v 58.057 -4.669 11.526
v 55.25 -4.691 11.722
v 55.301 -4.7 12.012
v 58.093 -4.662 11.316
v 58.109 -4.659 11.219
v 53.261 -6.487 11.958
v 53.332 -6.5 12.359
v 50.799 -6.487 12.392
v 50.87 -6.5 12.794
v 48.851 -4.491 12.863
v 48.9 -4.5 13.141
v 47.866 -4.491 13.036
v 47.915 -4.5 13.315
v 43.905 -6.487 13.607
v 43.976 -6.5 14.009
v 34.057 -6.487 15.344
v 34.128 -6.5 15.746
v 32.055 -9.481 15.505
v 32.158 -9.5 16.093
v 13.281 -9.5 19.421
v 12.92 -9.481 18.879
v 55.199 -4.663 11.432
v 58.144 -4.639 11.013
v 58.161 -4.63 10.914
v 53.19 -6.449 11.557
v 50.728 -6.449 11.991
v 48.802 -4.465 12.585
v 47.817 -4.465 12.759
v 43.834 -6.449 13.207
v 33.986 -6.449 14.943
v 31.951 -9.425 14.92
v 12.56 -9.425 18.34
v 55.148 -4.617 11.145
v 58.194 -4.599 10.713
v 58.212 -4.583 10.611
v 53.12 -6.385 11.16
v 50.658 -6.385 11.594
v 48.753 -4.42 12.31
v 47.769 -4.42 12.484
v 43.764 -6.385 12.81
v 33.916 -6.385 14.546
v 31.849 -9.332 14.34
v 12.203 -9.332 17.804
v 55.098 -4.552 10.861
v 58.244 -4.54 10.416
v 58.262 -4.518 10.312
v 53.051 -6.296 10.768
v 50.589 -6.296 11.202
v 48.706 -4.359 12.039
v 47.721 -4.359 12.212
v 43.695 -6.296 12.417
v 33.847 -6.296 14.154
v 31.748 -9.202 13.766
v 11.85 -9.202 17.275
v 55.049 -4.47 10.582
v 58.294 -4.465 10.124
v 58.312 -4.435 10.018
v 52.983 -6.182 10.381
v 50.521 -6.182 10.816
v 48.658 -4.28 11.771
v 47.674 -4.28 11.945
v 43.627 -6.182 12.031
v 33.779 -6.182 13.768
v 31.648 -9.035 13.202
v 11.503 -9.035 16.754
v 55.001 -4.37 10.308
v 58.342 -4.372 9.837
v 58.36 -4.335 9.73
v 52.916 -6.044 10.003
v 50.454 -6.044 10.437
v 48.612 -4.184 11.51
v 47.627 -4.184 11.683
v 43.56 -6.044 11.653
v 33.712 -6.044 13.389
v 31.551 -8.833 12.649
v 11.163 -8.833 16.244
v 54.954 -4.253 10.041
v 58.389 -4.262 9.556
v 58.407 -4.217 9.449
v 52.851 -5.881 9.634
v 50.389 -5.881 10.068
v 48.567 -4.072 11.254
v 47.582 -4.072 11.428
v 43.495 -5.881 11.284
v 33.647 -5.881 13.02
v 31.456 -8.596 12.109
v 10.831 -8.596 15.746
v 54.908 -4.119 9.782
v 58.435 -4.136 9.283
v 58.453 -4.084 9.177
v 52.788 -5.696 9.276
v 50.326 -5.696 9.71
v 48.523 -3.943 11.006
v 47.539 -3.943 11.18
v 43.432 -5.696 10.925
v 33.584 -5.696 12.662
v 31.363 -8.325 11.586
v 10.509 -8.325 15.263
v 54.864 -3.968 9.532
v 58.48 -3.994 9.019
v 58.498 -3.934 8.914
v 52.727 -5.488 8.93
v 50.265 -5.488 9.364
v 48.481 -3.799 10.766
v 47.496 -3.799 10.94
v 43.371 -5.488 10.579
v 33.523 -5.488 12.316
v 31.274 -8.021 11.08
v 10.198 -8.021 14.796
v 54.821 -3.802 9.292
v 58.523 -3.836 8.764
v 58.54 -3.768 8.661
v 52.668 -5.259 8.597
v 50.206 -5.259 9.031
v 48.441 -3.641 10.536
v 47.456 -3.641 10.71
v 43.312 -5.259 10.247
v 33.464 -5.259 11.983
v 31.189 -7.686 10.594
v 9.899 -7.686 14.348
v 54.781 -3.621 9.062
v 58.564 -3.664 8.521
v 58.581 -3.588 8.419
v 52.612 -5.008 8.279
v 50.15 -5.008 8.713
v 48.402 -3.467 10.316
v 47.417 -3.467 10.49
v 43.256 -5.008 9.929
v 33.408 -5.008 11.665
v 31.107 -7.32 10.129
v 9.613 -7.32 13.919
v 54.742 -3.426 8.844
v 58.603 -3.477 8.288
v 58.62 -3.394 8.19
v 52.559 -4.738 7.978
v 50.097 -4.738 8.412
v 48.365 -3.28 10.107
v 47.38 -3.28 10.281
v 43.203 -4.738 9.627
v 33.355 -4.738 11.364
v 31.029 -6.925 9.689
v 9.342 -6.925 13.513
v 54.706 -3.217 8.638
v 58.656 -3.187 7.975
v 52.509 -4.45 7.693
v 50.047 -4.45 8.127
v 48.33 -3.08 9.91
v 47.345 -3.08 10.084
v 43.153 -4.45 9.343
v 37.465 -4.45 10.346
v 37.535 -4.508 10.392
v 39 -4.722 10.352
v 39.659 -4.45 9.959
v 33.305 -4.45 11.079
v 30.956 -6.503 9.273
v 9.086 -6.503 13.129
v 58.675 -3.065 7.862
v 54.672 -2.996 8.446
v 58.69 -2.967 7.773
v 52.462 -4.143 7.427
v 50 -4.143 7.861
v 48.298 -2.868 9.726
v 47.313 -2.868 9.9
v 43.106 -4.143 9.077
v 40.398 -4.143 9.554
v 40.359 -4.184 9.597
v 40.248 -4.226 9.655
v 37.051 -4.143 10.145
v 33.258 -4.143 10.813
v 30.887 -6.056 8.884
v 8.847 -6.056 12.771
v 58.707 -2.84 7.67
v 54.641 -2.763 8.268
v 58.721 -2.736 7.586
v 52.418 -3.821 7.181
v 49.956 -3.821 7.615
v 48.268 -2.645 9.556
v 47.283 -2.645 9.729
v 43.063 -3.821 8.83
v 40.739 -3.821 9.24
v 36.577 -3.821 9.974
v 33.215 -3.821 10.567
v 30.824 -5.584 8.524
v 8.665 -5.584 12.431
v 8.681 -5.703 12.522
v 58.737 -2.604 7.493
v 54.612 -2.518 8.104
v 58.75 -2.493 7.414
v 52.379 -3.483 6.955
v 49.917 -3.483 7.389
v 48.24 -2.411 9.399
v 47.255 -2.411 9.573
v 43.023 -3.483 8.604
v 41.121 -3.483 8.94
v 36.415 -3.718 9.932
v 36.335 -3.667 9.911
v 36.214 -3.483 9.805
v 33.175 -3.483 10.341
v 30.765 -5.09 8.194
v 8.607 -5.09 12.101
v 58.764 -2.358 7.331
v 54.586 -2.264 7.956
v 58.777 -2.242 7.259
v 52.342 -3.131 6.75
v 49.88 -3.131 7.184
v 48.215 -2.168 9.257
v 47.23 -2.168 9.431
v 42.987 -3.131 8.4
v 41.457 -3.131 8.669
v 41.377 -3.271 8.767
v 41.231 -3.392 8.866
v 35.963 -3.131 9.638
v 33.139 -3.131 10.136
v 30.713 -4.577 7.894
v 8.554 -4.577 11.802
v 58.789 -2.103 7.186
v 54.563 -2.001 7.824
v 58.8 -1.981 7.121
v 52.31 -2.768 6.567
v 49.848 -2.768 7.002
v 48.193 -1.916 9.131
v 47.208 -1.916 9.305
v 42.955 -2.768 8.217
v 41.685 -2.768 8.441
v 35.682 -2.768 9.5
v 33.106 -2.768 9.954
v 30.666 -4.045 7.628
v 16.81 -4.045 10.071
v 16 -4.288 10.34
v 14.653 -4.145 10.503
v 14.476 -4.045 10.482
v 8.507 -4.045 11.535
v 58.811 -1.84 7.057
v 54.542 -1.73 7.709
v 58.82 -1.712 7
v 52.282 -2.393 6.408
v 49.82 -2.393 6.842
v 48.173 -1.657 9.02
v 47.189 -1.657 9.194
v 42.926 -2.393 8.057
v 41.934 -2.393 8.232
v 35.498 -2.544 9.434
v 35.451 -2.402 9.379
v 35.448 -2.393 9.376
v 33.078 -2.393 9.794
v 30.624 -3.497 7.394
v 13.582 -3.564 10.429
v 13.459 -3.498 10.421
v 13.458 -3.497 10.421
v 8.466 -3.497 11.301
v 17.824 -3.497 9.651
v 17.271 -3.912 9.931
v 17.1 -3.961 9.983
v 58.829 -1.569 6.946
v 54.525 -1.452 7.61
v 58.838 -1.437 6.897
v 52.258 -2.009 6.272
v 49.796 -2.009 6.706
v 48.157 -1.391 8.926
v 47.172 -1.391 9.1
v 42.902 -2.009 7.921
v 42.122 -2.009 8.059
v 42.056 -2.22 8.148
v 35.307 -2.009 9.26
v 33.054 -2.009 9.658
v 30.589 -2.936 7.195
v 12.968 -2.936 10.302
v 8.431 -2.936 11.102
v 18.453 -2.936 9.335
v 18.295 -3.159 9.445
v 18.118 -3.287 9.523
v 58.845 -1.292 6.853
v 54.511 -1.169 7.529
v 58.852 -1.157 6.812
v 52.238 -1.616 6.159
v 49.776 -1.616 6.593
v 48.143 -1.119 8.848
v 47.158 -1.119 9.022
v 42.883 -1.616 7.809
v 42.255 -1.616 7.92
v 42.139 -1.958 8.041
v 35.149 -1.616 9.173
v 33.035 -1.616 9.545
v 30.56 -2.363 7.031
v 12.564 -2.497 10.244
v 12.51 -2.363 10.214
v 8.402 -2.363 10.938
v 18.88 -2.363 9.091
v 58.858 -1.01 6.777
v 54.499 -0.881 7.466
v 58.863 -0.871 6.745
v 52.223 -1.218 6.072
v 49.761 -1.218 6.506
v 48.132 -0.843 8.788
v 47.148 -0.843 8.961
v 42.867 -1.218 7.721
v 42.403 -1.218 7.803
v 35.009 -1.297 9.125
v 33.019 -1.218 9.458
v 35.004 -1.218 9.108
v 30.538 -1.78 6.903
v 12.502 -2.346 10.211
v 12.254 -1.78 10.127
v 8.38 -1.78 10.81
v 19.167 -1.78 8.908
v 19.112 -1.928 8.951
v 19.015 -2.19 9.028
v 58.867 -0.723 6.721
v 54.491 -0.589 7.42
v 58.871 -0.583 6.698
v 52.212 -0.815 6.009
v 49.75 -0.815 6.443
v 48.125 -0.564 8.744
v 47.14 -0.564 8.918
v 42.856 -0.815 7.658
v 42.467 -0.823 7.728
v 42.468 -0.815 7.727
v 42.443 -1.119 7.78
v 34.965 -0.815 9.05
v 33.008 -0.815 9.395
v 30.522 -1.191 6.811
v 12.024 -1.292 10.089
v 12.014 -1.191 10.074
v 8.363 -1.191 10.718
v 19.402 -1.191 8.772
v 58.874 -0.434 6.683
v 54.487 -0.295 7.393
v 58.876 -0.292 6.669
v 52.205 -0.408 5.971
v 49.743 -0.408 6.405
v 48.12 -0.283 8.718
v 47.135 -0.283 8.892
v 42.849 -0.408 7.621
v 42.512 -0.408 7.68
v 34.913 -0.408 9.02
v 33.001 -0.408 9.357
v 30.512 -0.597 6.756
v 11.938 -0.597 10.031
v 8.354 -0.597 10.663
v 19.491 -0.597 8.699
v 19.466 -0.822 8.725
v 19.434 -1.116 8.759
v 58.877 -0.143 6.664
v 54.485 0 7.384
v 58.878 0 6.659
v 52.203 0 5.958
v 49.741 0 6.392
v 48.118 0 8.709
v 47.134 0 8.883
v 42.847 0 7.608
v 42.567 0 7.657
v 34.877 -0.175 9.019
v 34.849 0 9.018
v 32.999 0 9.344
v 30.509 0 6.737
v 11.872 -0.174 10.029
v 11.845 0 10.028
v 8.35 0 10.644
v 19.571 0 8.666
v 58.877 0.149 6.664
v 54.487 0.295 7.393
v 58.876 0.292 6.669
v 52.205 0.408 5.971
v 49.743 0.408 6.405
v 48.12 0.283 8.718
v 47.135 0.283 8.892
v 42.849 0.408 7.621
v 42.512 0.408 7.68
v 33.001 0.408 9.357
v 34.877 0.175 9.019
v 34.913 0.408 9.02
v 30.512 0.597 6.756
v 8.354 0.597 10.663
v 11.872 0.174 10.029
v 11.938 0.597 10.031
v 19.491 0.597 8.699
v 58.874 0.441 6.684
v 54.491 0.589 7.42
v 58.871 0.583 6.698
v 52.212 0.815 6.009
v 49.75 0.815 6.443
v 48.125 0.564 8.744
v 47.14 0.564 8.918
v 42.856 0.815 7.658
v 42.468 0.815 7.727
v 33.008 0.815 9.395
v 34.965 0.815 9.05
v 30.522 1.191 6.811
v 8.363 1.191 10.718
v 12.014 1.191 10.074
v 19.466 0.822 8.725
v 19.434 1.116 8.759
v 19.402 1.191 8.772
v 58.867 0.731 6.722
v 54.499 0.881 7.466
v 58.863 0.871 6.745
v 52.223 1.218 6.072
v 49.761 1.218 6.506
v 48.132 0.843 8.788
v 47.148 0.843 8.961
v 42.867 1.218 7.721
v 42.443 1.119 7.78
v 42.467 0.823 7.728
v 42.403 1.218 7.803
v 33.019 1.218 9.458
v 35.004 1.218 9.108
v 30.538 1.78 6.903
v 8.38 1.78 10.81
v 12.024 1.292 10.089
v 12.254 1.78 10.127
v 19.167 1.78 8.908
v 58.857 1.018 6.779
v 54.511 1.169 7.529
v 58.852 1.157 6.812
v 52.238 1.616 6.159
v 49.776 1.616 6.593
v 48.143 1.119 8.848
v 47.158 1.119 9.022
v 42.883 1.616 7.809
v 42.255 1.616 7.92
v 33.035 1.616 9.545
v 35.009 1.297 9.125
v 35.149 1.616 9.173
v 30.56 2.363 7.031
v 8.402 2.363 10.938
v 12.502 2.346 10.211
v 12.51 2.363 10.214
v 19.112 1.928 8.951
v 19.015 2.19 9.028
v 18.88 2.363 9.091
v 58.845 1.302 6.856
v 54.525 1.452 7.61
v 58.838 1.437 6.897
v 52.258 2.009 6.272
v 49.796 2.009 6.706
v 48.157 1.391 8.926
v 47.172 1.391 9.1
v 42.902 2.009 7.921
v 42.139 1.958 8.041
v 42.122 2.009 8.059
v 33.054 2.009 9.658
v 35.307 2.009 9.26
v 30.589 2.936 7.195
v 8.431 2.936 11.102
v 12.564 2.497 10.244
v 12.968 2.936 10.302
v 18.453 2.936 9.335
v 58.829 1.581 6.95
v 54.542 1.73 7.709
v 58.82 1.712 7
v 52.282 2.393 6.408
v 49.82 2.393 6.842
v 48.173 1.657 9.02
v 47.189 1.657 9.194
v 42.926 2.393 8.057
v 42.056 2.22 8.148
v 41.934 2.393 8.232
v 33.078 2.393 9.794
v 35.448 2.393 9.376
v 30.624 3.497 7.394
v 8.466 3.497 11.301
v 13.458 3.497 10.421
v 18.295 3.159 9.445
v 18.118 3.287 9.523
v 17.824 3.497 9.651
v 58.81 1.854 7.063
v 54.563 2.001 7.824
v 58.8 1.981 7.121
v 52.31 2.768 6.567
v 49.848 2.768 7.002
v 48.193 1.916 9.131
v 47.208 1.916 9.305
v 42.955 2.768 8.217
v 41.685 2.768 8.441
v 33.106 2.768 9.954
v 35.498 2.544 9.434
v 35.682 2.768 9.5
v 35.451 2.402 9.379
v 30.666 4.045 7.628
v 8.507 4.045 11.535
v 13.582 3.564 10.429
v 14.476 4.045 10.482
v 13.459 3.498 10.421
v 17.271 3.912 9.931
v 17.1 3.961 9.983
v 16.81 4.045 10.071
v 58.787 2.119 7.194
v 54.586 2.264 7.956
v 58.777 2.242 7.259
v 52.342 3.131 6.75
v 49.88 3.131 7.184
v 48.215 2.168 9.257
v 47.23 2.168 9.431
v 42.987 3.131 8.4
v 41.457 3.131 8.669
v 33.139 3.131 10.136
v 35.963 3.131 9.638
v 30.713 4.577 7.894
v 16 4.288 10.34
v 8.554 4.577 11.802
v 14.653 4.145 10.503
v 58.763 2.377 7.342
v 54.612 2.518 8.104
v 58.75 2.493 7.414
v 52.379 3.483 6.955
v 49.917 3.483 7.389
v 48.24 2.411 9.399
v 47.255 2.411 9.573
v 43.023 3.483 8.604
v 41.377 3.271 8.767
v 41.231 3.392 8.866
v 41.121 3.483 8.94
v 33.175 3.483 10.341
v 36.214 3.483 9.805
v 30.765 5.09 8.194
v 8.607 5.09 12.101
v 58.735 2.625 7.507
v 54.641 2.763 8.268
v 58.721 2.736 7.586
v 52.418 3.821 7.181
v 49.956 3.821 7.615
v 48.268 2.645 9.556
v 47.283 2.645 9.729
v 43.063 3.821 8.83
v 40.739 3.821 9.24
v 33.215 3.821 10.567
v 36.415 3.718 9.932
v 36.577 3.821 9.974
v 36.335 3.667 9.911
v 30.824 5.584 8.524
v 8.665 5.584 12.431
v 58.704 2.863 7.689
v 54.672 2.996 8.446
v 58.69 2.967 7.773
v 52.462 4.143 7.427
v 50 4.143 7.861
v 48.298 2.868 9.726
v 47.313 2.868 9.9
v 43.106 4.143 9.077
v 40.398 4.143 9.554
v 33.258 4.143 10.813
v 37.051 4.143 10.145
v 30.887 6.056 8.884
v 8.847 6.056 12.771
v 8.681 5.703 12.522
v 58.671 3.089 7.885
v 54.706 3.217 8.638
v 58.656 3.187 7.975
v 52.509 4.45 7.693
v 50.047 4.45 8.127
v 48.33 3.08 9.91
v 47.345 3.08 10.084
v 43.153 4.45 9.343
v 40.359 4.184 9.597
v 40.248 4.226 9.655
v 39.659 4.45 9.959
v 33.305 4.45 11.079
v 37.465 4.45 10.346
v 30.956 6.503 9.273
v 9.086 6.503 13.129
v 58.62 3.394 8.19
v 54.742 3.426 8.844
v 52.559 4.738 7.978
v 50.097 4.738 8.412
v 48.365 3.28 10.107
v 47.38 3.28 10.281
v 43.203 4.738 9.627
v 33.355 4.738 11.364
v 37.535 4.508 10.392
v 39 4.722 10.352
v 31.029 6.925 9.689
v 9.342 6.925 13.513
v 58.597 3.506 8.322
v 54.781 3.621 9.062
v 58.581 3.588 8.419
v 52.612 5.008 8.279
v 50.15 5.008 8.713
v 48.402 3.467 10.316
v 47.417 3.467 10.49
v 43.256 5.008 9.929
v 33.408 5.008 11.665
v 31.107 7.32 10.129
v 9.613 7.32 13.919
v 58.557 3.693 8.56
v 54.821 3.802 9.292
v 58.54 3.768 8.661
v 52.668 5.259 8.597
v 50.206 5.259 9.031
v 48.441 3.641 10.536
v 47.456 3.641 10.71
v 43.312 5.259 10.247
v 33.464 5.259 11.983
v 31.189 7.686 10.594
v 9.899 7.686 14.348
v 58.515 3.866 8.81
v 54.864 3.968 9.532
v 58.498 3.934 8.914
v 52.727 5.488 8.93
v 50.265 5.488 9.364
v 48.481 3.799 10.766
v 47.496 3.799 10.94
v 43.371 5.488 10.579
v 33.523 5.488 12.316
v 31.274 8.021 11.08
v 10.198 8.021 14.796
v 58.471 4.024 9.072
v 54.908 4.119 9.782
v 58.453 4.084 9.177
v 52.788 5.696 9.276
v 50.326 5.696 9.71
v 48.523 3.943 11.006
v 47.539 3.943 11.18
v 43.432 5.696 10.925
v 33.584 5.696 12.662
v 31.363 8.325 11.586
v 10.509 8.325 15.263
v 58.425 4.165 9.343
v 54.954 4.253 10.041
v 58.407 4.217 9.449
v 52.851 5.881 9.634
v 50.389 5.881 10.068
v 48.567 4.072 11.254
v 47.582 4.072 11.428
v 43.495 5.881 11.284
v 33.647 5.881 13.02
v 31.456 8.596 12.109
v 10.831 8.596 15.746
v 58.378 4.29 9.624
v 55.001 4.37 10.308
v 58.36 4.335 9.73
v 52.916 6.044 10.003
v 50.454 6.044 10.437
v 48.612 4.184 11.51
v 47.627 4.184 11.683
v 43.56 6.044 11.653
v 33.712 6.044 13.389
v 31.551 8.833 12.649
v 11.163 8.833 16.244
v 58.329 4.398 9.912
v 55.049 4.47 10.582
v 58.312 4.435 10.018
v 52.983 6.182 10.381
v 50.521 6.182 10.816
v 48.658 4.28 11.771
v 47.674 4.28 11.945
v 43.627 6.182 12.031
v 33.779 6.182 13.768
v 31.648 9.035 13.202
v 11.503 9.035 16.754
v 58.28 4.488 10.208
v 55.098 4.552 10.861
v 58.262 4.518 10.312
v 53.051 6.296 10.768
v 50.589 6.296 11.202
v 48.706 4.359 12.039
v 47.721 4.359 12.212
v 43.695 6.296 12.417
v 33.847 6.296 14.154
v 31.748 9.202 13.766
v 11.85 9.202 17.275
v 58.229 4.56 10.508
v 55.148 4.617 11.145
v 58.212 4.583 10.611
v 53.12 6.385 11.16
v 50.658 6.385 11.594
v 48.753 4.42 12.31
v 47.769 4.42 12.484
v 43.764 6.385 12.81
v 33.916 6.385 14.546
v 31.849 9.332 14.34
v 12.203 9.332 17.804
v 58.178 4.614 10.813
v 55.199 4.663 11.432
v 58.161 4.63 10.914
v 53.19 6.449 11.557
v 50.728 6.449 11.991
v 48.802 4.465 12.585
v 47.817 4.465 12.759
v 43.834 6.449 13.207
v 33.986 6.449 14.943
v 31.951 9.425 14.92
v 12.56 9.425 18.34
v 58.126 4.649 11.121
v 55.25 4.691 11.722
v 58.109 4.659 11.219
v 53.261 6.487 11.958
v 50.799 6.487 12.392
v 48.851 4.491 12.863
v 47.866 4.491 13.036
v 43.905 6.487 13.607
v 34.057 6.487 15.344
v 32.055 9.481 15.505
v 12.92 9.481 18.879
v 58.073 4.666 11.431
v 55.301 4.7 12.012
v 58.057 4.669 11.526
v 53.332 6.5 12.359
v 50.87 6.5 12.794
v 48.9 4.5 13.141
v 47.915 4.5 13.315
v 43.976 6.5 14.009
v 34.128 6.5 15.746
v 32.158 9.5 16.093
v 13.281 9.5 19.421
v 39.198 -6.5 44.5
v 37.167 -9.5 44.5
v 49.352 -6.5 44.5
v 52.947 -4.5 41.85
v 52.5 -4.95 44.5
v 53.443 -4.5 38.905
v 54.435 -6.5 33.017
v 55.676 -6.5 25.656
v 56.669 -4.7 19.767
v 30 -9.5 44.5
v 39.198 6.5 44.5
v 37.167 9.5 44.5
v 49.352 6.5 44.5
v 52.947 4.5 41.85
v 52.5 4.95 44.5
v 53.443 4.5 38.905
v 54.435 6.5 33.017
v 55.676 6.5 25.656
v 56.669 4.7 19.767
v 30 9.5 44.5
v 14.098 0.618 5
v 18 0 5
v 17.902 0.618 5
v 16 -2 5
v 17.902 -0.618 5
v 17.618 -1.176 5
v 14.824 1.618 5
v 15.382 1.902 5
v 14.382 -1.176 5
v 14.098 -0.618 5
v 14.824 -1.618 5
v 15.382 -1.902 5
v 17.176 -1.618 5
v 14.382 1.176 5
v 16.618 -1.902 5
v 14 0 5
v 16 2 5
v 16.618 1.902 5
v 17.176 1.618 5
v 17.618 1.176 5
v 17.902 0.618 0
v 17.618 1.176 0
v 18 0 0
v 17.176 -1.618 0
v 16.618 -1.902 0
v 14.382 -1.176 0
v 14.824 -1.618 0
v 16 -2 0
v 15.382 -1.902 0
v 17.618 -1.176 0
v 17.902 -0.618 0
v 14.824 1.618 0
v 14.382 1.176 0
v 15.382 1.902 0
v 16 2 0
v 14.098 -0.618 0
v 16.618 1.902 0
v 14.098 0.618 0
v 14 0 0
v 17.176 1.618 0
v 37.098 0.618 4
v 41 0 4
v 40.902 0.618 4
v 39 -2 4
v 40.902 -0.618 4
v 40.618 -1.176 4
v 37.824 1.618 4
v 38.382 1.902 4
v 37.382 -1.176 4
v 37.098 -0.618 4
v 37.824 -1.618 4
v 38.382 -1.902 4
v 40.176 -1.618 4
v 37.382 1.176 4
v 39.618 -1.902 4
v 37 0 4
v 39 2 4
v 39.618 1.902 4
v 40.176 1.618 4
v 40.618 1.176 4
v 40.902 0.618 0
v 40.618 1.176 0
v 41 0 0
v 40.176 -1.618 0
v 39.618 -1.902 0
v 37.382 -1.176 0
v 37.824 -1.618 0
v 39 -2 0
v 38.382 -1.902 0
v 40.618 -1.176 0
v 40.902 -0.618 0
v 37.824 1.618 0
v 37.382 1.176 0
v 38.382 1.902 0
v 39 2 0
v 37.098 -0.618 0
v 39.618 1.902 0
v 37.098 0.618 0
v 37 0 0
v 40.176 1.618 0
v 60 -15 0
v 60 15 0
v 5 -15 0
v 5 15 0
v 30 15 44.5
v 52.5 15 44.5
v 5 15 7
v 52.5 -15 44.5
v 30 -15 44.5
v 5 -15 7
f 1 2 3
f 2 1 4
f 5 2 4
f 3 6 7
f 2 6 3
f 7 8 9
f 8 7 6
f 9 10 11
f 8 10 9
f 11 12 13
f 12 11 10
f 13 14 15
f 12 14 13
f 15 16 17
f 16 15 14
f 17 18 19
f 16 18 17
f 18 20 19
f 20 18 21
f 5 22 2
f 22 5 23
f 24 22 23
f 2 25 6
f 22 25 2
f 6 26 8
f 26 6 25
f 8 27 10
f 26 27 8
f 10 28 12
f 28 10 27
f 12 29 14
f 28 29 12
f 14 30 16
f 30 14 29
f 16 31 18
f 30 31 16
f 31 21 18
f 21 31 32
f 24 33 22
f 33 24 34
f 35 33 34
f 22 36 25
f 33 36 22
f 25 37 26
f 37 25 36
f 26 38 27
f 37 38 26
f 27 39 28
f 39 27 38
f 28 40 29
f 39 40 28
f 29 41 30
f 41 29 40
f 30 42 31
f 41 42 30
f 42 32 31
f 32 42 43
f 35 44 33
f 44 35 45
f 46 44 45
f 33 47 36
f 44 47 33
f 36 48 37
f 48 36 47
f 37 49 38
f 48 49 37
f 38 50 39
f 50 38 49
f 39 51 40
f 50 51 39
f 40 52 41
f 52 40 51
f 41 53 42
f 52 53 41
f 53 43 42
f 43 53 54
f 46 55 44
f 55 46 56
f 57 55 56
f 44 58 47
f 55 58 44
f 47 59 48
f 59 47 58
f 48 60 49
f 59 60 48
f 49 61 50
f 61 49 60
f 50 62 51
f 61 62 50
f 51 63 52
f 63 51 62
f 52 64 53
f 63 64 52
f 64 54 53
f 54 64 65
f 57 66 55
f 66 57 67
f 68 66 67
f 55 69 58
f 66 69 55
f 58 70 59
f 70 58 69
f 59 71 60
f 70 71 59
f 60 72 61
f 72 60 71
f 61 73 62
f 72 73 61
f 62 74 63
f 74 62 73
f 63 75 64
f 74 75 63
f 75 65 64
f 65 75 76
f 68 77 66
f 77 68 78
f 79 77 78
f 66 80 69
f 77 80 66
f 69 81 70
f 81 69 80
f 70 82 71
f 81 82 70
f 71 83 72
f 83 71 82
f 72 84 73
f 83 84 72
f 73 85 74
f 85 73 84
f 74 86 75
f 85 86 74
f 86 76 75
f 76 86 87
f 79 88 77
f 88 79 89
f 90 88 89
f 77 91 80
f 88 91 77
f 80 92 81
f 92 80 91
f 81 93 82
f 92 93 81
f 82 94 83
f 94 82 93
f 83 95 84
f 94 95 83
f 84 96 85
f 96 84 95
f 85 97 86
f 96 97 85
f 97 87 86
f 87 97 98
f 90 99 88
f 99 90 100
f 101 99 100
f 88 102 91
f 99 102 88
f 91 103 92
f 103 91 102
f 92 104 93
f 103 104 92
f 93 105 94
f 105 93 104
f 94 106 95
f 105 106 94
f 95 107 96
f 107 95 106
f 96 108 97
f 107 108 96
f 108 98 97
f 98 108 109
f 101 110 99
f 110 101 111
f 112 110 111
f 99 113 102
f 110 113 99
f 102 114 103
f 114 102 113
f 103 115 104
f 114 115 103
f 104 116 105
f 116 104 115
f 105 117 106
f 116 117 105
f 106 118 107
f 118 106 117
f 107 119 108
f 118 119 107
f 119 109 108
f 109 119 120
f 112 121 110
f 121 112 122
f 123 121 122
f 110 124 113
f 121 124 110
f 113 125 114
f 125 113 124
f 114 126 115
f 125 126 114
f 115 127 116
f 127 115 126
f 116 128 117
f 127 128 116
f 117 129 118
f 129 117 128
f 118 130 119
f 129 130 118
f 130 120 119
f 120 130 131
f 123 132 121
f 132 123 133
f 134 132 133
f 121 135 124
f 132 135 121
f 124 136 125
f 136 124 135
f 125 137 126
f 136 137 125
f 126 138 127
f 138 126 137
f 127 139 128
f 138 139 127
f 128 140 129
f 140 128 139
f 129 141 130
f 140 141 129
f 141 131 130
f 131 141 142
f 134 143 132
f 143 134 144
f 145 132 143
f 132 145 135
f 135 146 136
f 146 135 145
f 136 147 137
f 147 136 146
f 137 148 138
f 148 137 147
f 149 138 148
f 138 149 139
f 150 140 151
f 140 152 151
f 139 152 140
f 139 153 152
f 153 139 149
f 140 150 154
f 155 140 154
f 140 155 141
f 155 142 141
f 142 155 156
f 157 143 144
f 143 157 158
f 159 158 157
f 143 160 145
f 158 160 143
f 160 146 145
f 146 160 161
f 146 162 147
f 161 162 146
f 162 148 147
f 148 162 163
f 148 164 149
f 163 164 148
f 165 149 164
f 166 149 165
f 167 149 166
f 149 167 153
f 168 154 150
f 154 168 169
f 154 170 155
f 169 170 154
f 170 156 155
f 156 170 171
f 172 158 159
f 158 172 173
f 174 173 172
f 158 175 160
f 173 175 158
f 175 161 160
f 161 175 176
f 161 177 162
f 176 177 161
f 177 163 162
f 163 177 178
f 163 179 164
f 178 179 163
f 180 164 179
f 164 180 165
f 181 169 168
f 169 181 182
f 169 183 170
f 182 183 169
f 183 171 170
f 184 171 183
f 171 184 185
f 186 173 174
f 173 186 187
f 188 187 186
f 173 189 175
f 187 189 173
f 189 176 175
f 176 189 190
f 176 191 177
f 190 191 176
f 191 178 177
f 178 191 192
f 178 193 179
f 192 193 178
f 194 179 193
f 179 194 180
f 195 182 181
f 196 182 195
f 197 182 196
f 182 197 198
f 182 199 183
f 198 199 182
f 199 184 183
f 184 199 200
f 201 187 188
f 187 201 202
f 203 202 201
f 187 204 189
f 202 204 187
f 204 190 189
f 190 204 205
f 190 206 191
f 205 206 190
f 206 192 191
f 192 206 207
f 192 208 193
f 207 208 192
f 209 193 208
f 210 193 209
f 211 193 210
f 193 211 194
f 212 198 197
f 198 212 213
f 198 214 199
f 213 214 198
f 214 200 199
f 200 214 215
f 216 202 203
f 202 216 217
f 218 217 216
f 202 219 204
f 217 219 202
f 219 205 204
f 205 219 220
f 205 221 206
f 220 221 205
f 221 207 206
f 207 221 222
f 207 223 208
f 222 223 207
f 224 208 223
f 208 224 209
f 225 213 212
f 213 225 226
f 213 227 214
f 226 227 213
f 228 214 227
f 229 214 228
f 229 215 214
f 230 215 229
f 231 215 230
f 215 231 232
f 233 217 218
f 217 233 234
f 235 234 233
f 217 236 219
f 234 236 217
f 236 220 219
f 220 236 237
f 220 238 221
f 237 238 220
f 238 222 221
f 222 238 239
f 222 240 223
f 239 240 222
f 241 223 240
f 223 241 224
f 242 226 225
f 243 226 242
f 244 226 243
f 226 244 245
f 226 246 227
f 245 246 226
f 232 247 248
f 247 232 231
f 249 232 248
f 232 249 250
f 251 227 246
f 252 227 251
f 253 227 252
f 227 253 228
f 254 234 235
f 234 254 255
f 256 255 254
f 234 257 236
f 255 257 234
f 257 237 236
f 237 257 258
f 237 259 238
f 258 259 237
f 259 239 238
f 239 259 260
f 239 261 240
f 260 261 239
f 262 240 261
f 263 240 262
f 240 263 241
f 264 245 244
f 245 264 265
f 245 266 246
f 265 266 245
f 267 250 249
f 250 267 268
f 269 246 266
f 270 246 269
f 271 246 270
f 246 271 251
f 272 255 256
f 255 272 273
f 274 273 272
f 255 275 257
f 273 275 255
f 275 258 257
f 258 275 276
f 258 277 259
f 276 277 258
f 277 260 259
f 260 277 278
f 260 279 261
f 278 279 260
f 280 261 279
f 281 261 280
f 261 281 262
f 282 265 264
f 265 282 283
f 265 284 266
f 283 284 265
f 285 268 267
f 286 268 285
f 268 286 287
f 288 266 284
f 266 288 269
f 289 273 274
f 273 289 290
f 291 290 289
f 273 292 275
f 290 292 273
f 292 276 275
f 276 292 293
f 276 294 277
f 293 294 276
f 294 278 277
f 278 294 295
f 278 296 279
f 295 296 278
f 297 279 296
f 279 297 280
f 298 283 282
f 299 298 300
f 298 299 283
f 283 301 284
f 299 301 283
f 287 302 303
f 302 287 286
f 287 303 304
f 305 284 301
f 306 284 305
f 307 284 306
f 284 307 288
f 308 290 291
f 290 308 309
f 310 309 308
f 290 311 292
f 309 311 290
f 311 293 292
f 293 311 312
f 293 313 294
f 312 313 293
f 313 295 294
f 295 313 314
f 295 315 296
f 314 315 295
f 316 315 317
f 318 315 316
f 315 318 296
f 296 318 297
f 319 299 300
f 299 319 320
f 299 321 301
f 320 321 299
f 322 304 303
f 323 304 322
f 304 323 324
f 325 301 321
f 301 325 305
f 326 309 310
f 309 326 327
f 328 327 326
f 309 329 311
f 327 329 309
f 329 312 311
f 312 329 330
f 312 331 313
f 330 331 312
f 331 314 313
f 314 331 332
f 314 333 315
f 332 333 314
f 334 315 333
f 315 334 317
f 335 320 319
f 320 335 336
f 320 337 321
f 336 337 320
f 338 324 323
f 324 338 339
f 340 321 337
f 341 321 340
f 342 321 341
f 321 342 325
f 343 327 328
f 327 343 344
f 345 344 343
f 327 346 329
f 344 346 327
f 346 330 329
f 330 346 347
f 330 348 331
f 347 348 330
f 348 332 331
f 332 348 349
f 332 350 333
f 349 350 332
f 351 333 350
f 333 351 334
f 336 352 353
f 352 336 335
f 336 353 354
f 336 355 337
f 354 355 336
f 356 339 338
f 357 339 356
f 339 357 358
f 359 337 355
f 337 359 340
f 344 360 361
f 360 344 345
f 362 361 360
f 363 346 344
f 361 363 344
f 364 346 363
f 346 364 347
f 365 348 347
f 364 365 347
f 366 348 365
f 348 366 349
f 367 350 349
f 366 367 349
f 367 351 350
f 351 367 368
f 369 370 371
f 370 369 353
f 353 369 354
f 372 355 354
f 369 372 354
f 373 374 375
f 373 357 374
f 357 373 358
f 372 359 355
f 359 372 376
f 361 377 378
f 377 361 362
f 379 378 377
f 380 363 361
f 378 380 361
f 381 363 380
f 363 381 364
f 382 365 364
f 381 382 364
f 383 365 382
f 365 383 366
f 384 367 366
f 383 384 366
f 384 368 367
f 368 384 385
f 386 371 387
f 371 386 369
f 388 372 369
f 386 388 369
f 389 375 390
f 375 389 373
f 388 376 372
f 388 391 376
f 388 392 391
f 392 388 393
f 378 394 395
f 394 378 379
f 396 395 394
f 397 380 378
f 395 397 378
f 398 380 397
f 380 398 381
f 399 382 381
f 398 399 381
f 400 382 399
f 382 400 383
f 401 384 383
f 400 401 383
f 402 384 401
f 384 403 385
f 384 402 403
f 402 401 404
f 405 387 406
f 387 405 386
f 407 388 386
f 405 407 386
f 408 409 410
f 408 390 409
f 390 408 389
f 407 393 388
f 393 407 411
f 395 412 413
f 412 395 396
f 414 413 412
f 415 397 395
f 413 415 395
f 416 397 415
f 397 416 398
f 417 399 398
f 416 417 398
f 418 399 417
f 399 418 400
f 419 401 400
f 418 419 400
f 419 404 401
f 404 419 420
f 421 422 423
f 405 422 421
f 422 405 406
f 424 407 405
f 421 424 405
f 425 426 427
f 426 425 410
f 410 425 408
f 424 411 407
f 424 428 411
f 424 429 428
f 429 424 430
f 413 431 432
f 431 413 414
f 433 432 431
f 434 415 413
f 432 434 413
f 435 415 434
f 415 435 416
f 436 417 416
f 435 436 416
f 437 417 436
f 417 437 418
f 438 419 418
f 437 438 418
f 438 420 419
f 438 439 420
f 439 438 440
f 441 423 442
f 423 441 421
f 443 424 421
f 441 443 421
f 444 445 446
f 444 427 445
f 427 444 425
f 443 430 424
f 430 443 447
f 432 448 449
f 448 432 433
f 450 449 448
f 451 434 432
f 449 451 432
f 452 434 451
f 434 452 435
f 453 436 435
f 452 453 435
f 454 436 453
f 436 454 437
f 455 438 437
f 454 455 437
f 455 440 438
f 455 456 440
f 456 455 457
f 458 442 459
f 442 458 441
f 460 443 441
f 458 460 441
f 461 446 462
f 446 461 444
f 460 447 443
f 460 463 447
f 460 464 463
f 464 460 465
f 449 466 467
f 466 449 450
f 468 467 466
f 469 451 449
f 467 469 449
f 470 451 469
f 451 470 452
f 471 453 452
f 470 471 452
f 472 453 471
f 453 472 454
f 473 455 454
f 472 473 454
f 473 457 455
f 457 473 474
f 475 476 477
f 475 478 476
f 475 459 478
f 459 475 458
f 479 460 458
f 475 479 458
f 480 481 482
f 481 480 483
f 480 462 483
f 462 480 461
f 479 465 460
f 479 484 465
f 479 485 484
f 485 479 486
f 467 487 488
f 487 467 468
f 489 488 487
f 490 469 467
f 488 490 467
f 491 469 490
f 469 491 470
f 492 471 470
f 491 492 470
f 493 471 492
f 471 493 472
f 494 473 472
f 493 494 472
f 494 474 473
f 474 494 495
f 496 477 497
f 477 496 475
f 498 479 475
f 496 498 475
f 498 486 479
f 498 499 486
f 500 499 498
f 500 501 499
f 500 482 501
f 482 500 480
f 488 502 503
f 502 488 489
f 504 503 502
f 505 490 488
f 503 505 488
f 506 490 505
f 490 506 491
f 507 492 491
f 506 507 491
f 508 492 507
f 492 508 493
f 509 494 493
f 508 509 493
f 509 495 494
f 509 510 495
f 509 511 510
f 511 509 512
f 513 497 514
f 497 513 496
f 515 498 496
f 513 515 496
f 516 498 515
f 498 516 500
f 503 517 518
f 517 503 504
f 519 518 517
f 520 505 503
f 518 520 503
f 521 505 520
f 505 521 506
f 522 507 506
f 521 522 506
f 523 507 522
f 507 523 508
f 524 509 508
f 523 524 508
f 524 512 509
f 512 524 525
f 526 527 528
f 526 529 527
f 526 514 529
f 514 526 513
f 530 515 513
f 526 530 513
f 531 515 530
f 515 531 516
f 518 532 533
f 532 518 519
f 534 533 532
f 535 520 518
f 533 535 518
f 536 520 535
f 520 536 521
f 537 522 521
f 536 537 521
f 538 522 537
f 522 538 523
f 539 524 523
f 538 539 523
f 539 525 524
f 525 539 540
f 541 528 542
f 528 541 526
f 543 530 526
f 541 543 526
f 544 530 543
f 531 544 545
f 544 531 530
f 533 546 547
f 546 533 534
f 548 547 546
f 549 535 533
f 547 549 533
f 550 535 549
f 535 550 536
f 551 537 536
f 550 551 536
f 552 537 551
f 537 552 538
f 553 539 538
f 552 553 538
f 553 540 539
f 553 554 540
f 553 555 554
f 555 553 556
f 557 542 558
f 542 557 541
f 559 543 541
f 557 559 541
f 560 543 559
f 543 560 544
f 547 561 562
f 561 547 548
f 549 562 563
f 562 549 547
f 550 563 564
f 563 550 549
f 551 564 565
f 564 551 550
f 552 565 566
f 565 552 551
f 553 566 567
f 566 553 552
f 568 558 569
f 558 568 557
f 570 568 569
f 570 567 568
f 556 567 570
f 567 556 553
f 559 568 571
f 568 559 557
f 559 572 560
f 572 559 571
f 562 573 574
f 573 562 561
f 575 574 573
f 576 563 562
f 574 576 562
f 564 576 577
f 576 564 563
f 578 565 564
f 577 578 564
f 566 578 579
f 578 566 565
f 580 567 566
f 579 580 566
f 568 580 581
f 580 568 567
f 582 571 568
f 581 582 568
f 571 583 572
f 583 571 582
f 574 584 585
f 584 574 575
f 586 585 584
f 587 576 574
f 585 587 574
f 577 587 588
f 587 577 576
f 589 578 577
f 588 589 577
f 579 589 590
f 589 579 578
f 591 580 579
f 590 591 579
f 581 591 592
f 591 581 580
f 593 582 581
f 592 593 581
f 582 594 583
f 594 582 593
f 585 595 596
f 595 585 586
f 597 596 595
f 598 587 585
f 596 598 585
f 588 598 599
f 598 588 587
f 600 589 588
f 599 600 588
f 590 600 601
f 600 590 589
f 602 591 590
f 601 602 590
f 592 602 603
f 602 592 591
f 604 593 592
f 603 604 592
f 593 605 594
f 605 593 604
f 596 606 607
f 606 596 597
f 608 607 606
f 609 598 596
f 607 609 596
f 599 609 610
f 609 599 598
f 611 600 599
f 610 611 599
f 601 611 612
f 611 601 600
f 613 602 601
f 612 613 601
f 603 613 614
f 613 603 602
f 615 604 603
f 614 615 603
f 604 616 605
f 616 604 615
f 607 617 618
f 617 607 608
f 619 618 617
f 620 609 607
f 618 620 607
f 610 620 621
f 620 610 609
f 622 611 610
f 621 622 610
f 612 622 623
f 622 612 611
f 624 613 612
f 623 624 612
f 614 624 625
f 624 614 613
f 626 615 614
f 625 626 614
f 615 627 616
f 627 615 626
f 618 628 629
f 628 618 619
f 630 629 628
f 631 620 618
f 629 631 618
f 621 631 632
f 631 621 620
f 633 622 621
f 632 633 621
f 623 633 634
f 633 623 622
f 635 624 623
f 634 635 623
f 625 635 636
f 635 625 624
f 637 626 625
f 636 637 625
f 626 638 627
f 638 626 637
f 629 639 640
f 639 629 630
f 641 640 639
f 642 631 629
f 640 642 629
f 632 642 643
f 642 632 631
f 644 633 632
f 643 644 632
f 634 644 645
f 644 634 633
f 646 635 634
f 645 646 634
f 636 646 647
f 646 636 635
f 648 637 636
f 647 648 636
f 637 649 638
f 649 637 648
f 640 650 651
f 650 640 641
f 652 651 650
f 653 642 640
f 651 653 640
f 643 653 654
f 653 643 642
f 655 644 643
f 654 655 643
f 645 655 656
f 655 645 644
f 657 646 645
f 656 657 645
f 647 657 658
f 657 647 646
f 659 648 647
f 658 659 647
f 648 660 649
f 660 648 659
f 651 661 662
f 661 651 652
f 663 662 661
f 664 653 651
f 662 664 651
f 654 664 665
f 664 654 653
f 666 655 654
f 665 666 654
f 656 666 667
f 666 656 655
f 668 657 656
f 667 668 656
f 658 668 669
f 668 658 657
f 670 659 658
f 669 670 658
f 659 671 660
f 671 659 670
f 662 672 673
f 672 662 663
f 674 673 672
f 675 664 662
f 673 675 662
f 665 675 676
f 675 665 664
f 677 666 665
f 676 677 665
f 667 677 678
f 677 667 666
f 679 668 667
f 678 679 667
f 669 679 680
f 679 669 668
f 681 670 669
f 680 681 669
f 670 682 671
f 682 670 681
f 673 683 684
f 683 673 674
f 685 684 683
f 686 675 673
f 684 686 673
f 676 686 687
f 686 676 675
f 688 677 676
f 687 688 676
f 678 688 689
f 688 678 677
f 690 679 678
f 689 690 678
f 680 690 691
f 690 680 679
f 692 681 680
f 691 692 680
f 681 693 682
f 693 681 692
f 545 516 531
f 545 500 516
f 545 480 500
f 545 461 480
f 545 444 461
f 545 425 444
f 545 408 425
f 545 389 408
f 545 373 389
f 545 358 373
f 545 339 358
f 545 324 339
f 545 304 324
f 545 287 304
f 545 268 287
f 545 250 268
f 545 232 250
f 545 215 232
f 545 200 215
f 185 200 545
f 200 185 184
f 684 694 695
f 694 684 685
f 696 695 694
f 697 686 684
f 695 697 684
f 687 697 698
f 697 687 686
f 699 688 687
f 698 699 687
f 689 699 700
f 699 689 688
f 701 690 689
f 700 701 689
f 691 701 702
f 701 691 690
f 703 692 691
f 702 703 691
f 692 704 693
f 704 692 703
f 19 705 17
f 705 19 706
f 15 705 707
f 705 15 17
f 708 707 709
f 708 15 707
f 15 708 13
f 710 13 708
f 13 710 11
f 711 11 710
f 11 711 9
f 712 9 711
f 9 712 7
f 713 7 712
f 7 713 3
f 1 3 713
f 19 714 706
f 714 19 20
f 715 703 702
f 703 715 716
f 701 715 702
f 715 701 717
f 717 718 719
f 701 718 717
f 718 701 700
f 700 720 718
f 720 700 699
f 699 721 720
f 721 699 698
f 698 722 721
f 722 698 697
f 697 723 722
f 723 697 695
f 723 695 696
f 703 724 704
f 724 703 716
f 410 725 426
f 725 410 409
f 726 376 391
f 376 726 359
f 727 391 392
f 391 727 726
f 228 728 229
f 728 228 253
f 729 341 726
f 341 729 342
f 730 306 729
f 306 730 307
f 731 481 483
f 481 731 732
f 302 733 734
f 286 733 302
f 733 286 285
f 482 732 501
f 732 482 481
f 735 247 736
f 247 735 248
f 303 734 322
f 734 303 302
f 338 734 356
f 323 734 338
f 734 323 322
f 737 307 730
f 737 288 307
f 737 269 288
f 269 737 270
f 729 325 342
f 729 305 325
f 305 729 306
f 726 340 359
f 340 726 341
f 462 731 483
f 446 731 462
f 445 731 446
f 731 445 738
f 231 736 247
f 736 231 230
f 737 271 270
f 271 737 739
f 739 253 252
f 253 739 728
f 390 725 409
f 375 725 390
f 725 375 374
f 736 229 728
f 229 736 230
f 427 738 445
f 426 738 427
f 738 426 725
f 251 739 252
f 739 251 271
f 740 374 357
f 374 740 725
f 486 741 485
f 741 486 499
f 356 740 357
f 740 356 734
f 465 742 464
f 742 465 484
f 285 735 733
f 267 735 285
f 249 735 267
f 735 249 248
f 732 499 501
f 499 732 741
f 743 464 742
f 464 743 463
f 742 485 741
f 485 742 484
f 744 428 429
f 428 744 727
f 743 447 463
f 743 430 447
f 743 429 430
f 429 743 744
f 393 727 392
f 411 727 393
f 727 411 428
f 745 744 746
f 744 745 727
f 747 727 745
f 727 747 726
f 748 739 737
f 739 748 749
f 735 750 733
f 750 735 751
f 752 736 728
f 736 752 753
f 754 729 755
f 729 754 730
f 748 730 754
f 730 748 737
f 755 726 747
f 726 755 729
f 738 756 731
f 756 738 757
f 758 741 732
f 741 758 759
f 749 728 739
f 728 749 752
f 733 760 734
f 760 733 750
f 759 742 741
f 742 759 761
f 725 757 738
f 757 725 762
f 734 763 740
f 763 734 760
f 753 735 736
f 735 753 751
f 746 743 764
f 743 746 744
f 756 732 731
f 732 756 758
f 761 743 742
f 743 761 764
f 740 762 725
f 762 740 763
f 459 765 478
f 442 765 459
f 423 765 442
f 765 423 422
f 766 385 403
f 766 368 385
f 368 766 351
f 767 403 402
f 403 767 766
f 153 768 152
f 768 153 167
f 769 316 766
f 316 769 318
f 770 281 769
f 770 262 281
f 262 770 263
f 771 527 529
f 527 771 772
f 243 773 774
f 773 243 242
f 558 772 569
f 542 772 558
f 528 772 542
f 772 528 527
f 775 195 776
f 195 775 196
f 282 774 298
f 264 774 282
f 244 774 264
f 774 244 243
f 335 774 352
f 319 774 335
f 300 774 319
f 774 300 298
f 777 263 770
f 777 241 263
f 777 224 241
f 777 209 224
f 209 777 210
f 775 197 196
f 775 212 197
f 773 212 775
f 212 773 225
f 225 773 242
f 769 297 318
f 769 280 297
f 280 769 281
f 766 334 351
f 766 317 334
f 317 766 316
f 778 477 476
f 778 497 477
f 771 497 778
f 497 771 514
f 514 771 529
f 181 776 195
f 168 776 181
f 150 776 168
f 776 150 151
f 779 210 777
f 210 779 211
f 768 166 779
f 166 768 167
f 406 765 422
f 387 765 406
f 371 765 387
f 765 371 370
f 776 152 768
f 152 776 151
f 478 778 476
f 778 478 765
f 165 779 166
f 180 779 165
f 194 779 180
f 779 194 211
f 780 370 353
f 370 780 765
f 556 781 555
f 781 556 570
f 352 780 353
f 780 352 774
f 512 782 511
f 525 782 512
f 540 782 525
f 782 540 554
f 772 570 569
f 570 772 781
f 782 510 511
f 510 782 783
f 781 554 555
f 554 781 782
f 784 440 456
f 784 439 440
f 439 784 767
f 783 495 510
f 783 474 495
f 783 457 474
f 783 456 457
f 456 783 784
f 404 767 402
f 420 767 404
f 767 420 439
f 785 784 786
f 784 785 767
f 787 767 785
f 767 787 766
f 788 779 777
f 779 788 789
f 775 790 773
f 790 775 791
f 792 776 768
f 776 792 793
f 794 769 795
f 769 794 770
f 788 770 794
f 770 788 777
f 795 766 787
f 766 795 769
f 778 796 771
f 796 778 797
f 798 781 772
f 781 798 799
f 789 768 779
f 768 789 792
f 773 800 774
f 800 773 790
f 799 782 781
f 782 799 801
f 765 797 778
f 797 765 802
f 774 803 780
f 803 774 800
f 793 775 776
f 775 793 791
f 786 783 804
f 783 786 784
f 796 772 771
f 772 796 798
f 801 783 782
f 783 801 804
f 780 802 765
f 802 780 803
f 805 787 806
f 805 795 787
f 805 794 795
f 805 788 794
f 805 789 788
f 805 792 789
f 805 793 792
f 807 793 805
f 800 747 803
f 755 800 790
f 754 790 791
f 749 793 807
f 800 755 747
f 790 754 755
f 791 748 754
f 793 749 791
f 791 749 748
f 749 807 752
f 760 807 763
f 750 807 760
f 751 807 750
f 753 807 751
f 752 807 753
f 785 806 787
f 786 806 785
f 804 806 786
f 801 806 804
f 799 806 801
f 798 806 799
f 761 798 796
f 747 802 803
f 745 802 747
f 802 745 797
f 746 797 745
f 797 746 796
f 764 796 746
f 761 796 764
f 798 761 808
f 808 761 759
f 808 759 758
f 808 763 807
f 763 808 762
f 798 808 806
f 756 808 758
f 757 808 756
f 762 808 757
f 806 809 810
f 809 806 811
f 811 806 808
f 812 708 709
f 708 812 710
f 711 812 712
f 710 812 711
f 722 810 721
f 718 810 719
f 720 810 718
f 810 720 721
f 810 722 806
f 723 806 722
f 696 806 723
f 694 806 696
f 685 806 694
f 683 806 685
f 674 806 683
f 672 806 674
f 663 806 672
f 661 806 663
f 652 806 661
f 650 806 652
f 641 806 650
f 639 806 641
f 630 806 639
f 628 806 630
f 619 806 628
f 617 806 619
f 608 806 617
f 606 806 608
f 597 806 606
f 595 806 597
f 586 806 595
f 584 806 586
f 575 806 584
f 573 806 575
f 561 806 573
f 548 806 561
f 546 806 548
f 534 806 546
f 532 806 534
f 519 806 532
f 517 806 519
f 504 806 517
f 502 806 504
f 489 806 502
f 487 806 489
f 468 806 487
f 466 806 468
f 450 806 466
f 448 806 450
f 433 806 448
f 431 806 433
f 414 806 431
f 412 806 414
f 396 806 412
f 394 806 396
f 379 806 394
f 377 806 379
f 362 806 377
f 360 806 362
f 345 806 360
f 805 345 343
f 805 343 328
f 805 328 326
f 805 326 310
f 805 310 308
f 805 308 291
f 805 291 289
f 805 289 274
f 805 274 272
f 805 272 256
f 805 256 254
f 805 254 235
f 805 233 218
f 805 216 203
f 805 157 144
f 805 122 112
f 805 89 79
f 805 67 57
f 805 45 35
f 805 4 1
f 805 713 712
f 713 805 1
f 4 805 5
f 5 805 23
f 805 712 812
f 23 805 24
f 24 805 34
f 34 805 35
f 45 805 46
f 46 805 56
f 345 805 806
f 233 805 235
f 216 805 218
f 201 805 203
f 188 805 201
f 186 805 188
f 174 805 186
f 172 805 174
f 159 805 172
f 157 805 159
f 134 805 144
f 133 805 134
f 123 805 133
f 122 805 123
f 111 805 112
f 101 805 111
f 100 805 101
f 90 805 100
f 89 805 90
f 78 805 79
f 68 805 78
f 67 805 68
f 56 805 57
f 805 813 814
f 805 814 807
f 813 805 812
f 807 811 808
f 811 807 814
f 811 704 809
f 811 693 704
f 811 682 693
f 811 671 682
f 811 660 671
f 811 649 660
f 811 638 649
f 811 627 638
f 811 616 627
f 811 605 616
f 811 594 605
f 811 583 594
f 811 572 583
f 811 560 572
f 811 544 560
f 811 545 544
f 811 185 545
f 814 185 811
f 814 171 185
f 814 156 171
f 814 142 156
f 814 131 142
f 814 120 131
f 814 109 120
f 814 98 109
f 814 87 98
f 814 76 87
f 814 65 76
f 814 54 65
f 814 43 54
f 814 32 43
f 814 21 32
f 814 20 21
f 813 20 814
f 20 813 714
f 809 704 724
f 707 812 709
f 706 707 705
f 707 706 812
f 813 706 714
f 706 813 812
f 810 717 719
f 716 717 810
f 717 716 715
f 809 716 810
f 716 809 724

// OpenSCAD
// This is a cross section of the air-tool connector
// It models just one side of it as the shape will be created
// by extruding this profile

module profile(){
polygon([
 [0,0],        // start on center line
 [9.5,0],      // nut on bottom
 [9.5,22.5],
 [6.5,24.5],   // 2mm transition to 6.5mm
 [6.5,34.5],   // 10mm at 6.5mm radius
 [4.5,38.5],   // 4mm transition to 4.5mm
 [4.5,39.5],   // 1mm at 4.5 * THIS IS THE CRITICAL SUPPORT *
 [6.5,41.5],   // 2m transition back to 6.5mm radius
 [6.5,44],     // 2.5mm at 6.5mm radius
 [4.7,46],     // 2mm transition back to 4.7mm
 [4.6,55],     // clear above (extend if necessary)
 [0,55]        // back to center line
]);
}

// Spin the profile through 180 to create a rounded end
module round_end() { rotate_extrude(angle=180, $fn=100) profile();}

// Slide the profile down one side
module edge() { rotate([90,0,0]) linear_extrude(50) profile(); }

// Combine the rounded end and two copies of the sides
module air_tool() { round_end(); edge(); mirror([1,0,0]) edge(); }

// Orient it to subtract from the solid body we are about to create
module oriented_air_tool() { translate([10,0,20]) rotate([260,0,270]) air_tool(); }

// body
module body()
{
color("red") rotate([90,-90,0]) linear_extrude(30, center=true) polygon(points=[
    [7,-5],  // top right
    [44.5,-30],  // top right
    [44.5,-52.5],//top left
    [-0,-60], // bottom left
    [0,-5], // bottom right
    ]);
}

module screw_hole(h, x)
{
    color("blue") translate([x,0,h-7]) cylinder(7,2,5,$fn=20); translate([x,0,-0.001]) cylinder(h+1,2,2,$fn=20);
}

//oriented_air_tool();

difference(){
body();
    union() { oriented_air_tool(); screw_hole(12, 16); screw_hole(11, 39); }
}
